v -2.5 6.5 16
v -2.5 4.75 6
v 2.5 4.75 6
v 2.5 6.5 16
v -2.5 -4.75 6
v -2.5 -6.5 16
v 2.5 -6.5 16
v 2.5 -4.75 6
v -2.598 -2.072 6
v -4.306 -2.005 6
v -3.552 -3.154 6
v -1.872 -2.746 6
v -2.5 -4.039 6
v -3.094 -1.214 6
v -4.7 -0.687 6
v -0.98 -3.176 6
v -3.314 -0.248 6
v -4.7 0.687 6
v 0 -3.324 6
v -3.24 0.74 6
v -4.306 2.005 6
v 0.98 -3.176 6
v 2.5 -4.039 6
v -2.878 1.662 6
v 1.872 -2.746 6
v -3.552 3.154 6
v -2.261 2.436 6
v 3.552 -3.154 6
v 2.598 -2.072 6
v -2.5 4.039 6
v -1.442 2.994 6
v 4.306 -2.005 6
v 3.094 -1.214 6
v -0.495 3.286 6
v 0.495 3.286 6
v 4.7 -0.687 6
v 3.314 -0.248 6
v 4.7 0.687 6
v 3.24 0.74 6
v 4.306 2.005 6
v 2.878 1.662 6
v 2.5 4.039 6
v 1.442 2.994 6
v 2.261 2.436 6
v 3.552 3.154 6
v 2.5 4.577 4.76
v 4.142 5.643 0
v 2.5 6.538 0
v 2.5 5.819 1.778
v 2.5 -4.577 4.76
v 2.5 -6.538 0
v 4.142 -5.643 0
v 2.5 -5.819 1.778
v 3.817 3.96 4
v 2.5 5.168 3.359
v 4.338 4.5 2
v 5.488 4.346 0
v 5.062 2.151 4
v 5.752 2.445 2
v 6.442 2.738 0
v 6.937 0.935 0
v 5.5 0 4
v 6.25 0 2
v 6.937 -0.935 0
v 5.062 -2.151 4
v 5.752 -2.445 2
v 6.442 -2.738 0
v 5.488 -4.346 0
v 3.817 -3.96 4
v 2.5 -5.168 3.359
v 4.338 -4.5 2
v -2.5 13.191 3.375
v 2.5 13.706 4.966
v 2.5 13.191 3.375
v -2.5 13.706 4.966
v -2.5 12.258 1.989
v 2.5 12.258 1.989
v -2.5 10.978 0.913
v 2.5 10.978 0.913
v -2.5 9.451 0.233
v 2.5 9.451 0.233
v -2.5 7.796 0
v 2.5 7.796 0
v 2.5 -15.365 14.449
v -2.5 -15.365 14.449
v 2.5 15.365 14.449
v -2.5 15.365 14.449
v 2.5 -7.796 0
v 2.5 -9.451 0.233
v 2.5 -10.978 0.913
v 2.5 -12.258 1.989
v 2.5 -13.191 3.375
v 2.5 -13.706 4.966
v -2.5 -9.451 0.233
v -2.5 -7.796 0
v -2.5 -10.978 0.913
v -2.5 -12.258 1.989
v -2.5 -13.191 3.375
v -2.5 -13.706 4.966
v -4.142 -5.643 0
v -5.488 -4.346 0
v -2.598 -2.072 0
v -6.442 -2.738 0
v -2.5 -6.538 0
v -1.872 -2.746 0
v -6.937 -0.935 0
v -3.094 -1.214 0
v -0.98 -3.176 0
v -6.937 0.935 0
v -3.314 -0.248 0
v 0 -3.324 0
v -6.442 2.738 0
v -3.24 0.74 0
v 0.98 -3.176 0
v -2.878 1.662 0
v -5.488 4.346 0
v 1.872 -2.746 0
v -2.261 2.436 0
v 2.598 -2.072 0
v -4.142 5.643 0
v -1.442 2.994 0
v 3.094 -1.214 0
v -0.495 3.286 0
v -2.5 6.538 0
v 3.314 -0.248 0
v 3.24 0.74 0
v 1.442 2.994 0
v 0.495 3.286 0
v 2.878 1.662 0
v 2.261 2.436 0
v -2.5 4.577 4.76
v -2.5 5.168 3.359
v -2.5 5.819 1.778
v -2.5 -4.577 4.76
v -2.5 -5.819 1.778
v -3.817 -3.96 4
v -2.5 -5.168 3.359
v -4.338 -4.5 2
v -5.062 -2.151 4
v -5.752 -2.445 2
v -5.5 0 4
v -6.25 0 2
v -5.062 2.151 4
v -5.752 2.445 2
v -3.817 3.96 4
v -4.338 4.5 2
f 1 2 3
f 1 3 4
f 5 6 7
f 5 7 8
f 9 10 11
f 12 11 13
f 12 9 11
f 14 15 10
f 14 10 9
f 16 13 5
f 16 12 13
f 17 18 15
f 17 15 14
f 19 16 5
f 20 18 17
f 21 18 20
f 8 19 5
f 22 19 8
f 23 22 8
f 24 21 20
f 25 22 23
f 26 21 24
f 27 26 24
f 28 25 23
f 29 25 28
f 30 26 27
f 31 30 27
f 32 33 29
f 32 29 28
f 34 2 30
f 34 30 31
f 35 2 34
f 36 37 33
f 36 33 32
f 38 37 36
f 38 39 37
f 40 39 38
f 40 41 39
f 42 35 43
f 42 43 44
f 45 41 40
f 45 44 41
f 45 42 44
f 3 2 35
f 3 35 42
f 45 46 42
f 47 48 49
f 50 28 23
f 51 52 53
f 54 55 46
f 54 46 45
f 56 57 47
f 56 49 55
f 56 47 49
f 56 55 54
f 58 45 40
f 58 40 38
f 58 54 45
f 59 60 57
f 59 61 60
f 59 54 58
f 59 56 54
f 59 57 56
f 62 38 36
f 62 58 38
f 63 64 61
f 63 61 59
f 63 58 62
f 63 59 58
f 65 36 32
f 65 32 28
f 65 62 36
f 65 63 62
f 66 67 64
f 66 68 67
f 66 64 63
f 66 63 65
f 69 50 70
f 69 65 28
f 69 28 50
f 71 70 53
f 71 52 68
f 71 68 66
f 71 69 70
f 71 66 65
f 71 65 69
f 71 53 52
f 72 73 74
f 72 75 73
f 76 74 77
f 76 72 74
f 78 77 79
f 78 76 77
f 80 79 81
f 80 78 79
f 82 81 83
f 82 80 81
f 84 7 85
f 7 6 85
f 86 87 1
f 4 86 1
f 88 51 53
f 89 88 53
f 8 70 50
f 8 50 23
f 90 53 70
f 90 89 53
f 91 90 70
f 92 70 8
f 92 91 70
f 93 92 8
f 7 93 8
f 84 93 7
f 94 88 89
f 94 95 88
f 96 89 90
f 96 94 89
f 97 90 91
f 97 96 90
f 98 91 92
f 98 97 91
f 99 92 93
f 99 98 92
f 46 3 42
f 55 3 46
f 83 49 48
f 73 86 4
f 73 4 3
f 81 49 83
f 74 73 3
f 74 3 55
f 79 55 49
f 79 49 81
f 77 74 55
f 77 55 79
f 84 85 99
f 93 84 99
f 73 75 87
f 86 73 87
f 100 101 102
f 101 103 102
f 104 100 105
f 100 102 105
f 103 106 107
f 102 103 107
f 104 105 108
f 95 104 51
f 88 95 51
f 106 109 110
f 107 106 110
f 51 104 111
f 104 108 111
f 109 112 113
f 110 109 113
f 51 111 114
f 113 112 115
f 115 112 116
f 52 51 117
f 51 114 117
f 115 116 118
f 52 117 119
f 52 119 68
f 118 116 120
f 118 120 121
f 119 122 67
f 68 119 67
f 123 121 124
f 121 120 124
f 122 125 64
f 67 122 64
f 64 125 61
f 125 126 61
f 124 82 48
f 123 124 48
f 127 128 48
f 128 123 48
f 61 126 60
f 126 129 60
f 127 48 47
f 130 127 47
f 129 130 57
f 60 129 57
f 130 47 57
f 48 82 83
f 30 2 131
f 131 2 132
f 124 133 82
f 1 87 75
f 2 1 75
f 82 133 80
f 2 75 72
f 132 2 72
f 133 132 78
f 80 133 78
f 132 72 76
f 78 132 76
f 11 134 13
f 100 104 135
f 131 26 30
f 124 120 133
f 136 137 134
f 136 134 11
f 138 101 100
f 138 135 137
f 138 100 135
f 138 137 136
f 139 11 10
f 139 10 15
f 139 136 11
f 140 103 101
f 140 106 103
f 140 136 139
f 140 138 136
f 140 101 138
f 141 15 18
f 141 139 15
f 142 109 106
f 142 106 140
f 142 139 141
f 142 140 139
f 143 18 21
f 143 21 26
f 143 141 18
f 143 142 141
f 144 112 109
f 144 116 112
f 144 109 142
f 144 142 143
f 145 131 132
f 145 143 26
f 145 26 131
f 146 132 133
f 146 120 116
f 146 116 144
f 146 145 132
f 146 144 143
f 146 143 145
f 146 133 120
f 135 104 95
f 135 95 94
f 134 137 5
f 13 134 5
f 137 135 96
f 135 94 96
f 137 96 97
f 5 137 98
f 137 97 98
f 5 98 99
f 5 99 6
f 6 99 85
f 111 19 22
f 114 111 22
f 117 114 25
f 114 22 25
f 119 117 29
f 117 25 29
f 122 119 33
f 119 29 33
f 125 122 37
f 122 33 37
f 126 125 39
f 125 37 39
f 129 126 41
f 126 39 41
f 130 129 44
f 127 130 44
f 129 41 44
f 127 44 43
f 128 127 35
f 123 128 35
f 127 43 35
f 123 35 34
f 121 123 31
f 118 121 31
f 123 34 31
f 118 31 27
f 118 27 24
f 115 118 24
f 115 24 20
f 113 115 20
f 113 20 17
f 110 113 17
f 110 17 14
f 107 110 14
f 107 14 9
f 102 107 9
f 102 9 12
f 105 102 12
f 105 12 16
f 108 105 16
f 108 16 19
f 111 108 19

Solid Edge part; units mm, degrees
sketch "Sketch1" plane through (0, 0, 0) normal (0, 0, 1) x (1, 0, 0)
  circle A0 centre (0, 0) radius 7
  dimension "D1" = 14
extrude "Protrusion1" add sketch "Sketch1" along normal blind 6
sketch "Sketch2" plane through (0, 0, 0) normal (0, -1, 0) x (1, 0, 0)
  line L0 (-4.75, 6) -> (-7, 0)
  dimension "D1" = 4.75
revolve "RevolvedCutout1" cut sketch "Sketch2" angle 360 about axis through (0, 0, 54) along (0, 0, -1) material side at (-5.9218, 0, 3.0176)
hole "Hole_1" at (0, 0, 6) direction (0, 0, -1) diameter 6.647 end through all
sketch "Sketch3" plane through (0, 0, 0) normal (1, 0, 0) x (0, 1, 0)
  line L0 (-15.3653, 14.4486) -> (-13.7058, 4.9657)
  arc A0 (-13.7058, 4.9657) -> (-7.7956, 0) centre (-7.7956, 6) ccw
  line L1 (-7.7956, 0) -> (-6.0543, 0)
  line L2 (-3.75, 6) -> (-6.0543, 0)
  line L3 (-4.75, 6) -> (-3.75, 6)
  line L4 (-6.5, 16) -> (-4.75, 6)
  line L5 (-6.5, 16) -> (-15.3653, 14.4486)
extrude "ExtrudedProtrusion_3" add sketch "Sketch3" along normal mid plane 5
mirror "Mirror1" about plane through (0, 0, 0) normal (0, -1, 0) of "ExtrudedProtrusion_3"
